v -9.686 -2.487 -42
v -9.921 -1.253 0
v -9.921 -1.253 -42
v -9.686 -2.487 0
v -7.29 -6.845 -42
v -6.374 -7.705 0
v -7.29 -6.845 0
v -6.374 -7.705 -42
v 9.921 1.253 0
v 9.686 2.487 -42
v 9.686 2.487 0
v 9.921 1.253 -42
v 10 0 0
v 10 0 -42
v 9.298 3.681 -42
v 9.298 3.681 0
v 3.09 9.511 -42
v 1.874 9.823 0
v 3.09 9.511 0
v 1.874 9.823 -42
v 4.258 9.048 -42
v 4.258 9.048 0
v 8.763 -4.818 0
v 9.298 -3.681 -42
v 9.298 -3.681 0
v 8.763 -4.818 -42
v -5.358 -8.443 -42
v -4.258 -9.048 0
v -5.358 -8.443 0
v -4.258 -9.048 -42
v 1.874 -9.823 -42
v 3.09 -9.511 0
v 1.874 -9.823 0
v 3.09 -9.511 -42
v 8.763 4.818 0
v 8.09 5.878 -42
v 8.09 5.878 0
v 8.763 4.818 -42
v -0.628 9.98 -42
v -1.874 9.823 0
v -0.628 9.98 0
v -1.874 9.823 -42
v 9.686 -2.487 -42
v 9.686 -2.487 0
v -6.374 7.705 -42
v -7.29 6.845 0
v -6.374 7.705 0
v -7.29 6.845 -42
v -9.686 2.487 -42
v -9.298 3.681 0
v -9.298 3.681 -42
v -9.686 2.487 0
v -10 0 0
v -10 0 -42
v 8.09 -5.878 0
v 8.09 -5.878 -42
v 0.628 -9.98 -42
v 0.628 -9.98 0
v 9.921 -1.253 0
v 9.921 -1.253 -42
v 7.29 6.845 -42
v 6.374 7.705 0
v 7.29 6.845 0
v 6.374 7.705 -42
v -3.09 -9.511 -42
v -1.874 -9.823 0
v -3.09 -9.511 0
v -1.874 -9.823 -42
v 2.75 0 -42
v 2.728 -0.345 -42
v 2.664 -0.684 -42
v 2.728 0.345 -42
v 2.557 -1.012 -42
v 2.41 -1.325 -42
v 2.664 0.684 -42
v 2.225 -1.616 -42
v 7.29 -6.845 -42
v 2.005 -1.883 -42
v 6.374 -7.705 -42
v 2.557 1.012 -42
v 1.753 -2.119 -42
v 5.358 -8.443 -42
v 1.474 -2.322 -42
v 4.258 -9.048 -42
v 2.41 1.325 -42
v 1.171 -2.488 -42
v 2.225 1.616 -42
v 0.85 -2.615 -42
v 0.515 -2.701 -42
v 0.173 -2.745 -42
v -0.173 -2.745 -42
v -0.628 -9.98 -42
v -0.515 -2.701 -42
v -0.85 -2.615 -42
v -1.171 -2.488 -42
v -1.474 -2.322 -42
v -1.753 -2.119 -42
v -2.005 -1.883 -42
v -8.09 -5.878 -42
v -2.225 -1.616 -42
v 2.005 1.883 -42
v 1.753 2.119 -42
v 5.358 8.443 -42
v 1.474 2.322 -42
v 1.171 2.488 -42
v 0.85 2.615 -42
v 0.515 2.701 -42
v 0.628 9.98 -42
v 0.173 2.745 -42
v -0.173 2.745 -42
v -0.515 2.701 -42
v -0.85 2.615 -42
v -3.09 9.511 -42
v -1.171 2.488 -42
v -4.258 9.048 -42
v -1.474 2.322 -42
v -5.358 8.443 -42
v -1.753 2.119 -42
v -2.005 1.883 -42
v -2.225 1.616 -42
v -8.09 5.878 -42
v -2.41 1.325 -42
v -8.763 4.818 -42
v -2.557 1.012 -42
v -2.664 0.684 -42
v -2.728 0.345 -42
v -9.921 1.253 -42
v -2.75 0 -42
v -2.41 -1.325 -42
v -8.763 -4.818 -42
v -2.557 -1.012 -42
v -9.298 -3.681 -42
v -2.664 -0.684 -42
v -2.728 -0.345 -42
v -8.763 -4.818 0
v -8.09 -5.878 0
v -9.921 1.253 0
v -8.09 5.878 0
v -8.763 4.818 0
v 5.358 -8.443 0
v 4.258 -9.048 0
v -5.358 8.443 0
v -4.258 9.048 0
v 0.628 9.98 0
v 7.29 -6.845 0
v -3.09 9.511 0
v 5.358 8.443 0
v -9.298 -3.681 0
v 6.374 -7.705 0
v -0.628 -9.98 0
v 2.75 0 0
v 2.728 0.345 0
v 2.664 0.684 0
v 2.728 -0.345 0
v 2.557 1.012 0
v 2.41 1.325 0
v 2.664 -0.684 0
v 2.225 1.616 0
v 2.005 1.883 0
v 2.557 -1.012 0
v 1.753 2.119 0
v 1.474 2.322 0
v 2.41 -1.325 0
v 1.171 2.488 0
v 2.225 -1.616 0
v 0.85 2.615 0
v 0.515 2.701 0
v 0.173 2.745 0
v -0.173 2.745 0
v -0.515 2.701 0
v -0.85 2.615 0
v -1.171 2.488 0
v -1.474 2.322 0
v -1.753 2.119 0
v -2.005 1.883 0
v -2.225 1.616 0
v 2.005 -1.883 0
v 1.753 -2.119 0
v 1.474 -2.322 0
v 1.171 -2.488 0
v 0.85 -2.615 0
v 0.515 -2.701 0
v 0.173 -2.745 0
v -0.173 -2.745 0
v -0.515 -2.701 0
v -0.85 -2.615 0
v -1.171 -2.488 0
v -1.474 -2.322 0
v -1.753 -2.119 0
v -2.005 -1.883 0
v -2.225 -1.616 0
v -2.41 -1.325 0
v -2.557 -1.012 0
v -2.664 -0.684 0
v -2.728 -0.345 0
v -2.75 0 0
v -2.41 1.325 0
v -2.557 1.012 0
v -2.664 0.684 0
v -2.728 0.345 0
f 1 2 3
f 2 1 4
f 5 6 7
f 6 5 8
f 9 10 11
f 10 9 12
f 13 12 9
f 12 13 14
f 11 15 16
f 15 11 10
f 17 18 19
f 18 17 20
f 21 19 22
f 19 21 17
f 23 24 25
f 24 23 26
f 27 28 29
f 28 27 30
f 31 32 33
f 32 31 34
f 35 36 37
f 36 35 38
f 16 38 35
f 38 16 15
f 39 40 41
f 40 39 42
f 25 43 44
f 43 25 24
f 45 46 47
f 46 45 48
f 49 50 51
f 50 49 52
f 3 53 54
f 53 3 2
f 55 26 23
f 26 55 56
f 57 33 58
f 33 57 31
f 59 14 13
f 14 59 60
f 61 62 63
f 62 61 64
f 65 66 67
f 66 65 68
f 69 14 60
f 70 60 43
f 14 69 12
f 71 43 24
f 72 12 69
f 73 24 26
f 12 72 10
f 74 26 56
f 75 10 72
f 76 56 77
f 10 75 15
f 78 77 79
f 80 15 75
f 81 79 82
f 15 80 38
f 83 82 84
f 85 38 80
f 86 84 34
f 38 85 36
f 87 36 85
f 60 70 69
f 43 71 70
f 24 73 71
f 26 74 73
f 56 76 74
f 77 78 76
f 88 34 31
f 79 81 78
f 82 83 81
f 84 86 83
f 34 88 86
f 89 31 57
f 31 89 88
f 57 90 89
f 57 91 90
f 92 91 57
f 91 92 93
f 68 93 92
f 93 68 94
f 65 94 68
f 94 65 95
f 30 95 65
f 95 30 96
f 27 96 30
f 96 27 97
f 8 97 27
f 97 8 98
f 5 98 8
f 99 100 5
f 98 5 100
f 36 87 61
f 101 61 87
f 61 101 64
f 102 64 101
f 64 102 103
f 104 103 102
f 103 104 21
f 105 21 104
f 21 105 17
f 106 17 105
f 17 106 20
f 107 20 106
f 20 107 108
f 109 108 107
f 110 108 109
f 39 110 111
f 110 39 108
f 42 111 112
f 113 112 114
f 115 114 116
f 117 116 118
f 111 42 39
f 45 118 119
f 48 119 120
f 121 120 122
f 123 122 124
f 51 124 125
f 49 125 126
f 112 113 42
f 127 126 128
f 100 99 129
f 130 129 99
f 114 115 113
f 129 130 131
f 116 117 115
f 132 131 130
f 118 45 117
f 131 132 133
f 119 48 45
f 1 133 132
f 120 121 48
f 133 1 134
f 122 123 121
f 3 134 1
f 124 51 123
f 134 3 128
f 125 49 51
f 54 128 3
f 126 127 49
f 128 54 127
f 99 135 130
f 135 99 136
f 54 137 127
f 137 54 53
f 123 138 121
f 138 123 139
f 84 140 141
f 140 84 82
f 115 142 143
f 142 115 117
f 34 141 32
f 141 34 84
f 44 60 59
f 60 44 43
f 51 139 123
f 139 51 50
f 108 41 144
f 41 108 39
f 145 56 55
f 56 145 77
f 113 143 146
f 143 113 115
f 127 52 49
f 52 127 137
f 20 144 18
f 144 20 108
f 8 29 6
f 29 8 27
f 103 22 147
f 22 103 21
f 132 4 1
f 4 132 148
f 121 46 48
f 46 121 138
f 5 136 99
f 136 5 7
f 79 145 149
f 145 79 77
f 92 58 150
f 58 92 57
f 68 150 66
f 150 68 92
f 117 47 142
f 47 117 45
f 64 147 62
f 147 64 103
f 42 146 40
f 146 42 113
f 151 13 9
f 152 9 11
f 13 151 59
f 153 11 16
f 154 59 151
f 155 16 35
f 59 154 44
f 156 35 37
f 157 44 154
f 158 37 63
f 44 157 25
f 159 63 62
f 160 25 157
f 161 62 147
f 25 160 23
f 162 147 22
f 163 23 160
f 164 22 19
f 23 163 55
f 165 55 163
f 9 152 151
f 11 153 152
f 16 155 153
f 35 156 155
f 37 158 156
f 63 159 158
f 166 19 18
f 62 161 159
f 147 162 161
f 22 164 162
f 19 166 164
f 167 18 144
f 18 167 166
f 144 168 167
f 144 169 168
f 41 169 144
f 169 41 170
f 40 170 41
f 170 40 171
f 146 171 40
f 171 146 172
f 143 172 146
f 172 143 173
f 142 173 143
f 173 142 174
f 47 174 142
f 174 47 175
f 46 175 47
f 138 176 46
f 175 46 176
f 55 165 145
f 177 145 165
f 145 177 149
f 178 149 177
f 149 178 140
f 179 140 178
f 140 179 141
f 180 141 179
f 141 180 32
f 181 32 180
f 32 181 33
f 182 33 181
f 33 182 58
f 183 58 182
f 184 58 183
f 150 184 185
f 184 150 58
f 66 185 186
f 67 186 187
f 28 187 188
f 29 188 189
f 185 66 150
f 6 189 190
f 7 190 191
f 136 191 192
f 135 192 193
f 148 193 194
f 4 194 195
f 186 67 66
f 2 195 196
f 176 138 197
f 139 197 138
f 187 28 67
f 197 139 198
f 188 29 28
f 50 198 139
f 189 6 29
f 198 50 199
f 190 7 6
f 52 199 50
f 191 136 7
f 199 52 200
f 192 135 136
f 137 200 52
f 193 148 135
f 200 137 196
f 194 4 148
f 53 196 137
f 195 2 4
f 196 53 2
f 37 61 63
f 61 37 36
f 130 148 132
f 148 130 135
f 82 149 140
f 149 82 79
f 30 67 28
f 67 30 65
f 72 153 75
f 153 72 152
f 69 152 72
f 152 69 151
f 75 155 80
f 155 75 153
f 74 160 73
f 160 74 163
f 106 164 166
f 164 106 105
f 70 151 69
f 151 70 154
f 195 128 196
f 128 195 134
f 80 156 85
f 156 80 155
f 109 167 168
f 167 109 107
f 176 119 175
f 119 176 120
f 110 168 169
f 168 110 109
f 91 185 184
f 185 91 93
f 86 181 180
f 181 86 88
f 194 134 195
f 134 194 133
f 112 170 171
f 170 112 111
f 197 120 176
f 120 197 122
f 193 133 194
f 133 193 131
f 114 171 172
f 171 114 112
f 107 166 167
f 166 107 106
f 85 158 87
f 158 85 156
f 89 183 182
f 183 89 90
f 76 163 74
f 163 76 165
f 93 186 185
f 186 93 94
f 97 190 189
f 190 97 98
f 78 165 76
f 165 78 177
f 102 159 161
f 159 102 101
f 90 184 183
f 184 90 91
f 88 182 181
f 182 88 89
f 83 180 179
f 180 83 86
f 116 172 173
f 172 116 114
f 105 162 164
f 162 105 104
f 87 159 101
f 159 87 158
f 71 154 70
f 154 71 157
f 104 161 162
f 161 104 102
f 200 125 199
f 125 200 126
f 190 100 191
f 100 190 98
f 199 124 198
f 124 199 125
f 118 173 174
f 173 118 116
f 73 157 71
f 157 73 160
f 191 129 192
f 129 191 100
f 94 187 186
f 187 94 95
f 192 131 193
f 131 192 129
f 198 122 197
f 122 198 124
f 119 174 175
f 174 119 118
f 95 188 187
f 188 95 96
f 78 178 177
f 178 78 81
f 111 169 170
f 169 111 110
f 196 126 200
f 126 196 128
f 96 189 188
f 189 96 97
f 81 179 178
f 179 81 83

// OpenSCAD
$fn = 50;


difference() {
	union() {
		translate(v = [0, 0, -42.0000000000]) {
			cylinder(h = 42, r = 10.0000000000);
		}
		cylinder(h = 0, r = 19.0000000000);
	}
	union() {
		#translate(v = [0, 0, -42]) {
			cylinder(h = 42, r = 2.7500000000);
		}
	}
}
